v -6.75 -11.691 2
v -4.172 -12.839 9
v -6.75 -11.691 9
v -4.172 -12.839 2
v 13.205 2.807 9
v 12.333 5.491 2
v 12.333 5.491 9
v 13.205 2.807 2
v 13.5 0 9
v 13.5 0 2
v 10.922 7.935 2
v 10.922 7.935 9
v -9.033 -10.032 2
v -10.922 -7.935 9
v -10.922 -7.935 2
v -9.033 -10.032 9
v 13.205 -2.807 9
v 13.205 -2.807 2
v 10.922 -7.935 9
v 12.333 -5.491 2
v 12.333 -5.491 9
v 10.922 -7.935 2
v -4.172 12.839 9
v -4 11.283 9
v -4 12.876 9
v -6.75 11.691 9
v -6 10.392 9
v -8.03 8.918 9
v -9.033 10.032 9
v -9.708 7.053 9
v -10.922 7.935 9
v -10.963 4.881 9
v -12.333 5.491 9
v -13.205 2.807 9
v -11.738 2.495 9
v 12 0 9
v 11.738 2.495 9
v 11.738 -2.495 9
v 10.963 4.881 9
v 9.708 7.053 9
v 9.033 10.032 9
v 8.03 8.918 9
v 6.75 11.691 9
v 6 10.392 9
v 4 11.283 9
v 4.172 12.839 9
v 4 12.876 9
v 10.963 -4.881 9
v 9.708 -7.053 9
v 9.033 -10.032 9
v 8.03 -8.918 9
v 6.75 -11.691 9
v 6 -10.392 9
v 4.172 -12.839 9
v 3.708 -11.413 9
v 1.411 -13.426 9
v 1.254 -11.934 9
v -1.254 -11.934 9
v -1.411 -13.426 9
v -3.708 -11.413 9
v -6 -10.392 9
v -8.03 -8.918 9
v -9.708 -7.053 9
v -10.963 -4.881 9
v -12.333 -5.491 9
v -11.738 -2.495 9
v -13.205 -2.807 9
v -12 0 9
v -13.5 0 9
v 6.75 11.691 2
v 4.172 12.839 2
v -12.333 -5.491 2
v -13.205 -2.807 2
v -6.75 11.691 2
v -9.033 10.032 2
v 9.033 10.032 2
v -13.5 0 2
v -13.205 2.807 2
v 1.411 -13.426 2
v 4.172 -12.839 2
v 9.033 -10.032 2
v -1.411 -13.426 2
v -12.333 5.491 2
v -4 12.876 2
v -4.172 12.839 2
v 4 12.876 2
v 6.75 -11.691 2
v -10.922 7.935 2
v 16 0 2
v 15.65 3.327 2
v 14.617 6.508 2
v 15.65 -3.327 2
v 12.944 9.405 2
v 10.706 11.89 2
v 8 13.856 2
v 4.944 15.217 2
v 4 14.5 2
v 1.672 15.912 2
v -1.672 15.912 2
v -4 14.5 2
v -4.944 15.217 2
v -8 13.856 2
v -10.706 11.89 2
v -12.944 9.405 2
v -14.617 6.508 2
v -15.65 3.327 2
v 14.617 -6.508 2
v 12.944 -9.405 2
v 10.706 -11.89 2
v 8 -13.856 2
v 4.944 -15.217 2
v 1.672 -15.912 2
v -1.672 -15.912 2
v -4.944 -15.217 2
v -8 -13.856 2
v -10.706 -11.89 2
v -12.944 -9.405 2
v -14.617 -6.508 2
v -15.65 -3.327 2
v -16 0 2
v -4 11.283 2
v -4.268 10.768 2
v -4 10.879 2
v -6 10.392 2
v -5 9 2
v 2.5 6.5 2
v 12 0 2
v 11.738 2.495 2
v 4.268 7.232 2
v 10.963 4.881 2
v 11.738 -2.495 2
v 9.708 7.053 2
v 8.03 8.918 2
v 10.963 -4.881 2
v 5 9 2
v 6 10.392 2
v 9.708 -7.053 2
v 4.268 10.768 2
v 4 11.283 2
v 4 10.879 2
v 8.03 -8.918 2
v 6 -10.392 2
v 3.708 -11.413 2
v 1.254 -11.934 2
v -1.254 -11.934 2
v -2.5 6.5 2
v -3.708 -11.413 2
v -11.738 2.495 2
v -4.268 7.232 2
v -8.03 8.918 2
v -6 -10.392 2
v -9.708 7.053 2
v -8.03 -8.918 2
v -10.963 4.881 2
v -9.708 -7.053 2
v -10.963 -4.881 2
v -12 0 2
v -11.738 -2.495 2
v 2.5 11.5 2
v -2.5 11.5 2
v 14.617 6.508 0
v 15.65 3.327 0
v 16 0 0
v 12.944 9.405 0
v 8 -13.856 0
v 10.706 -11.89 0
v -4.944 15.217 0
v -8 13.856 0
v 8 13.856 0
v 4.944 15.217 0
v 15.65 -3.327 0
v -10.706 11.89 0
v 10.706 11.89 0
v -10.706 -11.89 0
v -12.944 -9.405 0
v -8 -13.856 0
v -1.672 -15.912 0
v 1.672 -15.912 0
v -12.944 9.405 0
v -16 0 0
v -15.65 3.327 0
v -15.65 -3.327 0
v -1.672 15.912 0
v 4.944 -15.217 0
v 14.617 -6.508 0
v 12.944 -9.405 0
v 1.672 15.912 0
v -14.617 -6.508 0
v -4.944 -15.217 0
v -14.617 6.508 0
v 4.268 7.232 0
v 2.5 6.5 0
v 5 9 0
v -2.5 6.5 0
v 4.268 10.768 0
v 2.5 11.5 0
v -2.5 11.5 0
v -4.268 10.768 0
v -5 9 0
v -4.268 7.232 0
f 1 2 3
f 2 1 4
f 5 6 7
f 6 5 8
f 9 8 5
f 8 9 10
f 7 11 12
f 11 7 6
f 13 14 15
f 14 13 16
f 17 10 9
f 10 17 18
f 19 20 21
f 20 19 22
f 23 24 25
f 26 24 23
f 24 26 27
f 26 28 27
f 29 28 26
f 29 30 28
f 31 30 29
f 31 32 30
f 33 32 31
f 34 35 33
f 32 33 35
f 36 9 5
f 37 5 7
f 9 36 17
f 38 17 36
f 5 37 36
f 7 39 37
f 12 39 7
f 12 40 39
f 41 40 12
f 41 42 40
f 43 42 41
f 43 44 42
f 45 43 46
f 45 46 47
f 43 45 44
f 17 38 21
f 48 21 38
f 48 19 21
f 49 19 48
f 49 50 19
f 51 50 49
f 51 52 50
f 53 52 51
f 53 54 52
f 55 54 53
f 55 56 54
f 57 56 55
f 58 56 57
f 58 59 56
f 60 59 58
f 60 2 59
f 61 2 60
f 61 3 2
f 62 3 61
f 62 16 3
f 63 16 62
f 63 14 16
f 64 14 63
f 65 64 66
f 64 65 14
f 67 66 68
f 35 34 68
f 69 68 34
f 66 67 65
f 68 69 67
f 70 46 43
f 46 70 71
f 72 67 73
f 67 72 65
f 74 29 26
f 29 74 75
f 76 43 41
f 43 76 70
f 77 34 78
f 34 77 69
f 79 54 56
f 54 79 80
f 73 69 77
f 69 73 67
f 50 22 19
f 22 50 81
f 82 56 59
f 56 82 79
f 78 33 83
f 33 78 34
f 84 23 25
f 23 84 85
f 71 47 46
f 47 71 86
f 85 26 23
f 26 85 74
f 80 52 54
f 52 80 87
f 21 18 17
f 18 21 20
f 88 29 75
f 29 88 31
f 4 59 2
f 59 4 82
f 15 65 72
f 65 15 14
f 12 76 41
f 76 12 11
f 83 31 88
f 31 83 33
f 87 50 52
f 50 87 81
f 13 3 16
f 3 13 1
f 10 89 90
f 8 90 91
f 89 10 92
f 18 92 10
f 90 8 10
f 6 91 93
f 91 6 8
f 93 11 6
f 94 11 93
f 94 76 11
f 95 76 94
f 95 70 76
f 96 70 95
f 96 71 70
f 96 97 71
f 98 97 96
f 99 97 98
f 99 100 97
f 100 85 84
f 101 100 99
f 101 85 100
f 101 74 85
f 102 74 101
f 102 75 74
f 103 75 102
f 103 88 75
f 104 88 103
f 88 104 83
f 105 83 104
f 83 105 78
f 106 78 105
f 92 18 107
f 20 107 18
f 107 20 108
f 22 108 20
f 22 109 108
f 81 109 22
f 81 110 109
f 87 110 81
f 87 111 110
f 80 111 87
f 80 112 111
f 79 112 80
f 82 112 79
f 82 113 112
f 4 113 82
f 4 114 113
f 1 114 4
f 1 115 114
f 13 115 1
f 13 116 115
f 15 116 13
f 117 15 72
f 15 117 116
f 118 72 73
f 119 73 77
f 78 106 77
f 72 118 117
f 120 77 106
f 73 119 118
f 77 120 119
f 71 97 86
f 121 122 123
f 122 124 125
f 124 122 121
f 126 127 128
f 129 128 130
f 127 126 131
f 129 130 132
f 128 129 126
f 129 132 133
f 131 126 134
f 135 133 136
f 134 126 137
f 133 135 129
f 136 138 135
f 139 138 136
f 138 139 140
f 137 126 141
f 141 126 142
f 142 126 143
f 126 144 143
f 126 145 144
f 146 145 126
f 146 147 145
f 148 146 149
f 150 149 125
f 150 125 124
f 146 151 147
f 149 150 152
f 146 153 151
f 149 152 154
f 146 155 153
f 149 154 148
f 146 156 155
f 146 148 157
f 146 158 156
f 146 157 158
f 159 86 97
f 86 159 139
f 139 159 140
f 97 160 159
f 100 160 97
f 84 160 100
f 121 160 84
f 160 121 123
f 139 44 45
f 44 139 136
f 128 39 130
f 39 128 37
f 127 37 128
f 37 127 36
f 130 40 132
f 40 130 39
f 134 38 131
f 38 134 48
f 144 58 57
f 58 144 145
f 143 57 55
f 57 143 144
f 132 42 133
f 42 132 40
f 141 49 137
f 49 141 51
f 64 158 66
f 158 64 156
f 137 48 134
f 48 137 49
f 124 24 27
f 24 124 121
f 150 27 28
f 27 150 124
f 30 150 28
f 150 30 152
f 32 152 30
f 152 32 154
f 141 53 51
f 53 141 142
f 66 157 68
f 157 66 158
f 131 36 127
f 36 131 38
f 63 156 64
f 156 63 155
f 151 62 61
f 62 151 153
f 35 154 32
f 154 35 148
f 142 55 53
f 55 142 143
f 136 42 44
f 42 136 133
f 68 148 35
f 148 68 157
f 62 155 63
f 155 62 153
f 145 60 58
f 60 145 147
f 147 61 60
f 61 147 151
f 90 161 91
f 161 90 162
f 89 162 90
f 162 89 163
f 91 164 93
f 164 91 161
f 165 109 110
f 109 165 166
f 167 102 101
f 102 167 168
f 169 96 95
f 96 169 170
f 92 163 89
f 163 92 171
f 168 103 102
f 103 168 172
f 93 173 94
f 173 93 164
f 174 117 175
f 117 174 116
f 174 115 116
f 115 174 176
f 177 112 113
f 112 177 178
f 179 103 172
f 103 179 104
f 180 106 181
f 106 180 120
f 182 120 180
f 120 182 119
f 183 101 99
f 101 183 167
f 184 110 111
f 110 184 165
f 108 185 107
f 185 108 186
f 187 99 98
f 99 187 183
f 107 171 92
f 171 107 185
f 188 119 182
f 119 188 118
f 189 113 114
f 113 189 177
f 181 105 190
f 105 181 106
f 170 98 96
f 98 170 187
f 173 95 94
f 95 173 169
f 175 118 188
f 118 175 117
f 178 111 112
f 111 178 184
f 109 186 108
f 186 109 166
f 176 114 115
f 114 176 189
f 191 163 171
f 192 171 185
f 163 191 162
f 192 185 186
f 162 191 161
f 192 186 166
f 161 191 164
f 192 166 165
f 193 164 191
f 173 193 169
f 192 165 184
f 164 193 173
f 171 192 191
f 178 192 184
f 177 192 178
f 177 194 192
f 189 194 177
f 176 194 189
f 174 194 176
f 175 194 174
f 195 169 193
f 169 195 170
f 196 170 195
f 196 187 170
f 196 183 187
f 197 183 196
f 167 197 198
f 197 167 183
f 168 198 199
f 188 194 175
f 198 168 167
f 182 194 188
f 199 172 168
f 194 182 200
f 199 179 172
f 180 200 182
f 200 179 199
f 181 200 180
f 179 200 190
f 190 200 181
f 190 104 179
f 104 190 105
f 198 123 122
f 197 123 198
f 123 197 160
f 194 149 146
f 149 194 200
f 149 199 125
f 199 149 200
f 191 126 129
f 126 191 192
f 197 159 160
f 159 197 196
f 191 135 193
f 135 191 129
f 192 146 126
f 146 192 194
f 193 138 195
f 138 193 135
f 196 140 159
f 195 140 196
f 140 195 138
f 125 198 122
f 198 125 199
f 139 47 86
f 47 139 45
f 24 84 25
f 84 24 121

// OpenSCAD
dia1=27;
dia2=dia1+5;
dia3=dia1-3;
h1=2;
h2=7;

cable_hole_x=8;
cable_hole_y=5;


module cable_hole() {
  hull() {
  translate([cable_hole_y/2,0,0])
    cylinder(d=cable_hole_y, h=h1, center=false);
  translate([-cable_hole_y/2,0,0])
    cylinder(d=cable_hole_y, h=h1, center=false);
  }
}


module plug() {
  cylinder(d=dia2, h=h1, center=false);
  difference() {
    translate([0, 0, h1]) cylinder(d=dia1, h=h2, center=false);
    translate([0, 0, h1]) cylinder(d=dia3, h=h2, center=false);
  }
    
}

difference() {
plug();
translate([0, 9, 0]) cable_hole();
translate([0, 12, h1+0.5*h2]) cube([cable_hole_x, cable_hole_y, h2], center=true);
}
